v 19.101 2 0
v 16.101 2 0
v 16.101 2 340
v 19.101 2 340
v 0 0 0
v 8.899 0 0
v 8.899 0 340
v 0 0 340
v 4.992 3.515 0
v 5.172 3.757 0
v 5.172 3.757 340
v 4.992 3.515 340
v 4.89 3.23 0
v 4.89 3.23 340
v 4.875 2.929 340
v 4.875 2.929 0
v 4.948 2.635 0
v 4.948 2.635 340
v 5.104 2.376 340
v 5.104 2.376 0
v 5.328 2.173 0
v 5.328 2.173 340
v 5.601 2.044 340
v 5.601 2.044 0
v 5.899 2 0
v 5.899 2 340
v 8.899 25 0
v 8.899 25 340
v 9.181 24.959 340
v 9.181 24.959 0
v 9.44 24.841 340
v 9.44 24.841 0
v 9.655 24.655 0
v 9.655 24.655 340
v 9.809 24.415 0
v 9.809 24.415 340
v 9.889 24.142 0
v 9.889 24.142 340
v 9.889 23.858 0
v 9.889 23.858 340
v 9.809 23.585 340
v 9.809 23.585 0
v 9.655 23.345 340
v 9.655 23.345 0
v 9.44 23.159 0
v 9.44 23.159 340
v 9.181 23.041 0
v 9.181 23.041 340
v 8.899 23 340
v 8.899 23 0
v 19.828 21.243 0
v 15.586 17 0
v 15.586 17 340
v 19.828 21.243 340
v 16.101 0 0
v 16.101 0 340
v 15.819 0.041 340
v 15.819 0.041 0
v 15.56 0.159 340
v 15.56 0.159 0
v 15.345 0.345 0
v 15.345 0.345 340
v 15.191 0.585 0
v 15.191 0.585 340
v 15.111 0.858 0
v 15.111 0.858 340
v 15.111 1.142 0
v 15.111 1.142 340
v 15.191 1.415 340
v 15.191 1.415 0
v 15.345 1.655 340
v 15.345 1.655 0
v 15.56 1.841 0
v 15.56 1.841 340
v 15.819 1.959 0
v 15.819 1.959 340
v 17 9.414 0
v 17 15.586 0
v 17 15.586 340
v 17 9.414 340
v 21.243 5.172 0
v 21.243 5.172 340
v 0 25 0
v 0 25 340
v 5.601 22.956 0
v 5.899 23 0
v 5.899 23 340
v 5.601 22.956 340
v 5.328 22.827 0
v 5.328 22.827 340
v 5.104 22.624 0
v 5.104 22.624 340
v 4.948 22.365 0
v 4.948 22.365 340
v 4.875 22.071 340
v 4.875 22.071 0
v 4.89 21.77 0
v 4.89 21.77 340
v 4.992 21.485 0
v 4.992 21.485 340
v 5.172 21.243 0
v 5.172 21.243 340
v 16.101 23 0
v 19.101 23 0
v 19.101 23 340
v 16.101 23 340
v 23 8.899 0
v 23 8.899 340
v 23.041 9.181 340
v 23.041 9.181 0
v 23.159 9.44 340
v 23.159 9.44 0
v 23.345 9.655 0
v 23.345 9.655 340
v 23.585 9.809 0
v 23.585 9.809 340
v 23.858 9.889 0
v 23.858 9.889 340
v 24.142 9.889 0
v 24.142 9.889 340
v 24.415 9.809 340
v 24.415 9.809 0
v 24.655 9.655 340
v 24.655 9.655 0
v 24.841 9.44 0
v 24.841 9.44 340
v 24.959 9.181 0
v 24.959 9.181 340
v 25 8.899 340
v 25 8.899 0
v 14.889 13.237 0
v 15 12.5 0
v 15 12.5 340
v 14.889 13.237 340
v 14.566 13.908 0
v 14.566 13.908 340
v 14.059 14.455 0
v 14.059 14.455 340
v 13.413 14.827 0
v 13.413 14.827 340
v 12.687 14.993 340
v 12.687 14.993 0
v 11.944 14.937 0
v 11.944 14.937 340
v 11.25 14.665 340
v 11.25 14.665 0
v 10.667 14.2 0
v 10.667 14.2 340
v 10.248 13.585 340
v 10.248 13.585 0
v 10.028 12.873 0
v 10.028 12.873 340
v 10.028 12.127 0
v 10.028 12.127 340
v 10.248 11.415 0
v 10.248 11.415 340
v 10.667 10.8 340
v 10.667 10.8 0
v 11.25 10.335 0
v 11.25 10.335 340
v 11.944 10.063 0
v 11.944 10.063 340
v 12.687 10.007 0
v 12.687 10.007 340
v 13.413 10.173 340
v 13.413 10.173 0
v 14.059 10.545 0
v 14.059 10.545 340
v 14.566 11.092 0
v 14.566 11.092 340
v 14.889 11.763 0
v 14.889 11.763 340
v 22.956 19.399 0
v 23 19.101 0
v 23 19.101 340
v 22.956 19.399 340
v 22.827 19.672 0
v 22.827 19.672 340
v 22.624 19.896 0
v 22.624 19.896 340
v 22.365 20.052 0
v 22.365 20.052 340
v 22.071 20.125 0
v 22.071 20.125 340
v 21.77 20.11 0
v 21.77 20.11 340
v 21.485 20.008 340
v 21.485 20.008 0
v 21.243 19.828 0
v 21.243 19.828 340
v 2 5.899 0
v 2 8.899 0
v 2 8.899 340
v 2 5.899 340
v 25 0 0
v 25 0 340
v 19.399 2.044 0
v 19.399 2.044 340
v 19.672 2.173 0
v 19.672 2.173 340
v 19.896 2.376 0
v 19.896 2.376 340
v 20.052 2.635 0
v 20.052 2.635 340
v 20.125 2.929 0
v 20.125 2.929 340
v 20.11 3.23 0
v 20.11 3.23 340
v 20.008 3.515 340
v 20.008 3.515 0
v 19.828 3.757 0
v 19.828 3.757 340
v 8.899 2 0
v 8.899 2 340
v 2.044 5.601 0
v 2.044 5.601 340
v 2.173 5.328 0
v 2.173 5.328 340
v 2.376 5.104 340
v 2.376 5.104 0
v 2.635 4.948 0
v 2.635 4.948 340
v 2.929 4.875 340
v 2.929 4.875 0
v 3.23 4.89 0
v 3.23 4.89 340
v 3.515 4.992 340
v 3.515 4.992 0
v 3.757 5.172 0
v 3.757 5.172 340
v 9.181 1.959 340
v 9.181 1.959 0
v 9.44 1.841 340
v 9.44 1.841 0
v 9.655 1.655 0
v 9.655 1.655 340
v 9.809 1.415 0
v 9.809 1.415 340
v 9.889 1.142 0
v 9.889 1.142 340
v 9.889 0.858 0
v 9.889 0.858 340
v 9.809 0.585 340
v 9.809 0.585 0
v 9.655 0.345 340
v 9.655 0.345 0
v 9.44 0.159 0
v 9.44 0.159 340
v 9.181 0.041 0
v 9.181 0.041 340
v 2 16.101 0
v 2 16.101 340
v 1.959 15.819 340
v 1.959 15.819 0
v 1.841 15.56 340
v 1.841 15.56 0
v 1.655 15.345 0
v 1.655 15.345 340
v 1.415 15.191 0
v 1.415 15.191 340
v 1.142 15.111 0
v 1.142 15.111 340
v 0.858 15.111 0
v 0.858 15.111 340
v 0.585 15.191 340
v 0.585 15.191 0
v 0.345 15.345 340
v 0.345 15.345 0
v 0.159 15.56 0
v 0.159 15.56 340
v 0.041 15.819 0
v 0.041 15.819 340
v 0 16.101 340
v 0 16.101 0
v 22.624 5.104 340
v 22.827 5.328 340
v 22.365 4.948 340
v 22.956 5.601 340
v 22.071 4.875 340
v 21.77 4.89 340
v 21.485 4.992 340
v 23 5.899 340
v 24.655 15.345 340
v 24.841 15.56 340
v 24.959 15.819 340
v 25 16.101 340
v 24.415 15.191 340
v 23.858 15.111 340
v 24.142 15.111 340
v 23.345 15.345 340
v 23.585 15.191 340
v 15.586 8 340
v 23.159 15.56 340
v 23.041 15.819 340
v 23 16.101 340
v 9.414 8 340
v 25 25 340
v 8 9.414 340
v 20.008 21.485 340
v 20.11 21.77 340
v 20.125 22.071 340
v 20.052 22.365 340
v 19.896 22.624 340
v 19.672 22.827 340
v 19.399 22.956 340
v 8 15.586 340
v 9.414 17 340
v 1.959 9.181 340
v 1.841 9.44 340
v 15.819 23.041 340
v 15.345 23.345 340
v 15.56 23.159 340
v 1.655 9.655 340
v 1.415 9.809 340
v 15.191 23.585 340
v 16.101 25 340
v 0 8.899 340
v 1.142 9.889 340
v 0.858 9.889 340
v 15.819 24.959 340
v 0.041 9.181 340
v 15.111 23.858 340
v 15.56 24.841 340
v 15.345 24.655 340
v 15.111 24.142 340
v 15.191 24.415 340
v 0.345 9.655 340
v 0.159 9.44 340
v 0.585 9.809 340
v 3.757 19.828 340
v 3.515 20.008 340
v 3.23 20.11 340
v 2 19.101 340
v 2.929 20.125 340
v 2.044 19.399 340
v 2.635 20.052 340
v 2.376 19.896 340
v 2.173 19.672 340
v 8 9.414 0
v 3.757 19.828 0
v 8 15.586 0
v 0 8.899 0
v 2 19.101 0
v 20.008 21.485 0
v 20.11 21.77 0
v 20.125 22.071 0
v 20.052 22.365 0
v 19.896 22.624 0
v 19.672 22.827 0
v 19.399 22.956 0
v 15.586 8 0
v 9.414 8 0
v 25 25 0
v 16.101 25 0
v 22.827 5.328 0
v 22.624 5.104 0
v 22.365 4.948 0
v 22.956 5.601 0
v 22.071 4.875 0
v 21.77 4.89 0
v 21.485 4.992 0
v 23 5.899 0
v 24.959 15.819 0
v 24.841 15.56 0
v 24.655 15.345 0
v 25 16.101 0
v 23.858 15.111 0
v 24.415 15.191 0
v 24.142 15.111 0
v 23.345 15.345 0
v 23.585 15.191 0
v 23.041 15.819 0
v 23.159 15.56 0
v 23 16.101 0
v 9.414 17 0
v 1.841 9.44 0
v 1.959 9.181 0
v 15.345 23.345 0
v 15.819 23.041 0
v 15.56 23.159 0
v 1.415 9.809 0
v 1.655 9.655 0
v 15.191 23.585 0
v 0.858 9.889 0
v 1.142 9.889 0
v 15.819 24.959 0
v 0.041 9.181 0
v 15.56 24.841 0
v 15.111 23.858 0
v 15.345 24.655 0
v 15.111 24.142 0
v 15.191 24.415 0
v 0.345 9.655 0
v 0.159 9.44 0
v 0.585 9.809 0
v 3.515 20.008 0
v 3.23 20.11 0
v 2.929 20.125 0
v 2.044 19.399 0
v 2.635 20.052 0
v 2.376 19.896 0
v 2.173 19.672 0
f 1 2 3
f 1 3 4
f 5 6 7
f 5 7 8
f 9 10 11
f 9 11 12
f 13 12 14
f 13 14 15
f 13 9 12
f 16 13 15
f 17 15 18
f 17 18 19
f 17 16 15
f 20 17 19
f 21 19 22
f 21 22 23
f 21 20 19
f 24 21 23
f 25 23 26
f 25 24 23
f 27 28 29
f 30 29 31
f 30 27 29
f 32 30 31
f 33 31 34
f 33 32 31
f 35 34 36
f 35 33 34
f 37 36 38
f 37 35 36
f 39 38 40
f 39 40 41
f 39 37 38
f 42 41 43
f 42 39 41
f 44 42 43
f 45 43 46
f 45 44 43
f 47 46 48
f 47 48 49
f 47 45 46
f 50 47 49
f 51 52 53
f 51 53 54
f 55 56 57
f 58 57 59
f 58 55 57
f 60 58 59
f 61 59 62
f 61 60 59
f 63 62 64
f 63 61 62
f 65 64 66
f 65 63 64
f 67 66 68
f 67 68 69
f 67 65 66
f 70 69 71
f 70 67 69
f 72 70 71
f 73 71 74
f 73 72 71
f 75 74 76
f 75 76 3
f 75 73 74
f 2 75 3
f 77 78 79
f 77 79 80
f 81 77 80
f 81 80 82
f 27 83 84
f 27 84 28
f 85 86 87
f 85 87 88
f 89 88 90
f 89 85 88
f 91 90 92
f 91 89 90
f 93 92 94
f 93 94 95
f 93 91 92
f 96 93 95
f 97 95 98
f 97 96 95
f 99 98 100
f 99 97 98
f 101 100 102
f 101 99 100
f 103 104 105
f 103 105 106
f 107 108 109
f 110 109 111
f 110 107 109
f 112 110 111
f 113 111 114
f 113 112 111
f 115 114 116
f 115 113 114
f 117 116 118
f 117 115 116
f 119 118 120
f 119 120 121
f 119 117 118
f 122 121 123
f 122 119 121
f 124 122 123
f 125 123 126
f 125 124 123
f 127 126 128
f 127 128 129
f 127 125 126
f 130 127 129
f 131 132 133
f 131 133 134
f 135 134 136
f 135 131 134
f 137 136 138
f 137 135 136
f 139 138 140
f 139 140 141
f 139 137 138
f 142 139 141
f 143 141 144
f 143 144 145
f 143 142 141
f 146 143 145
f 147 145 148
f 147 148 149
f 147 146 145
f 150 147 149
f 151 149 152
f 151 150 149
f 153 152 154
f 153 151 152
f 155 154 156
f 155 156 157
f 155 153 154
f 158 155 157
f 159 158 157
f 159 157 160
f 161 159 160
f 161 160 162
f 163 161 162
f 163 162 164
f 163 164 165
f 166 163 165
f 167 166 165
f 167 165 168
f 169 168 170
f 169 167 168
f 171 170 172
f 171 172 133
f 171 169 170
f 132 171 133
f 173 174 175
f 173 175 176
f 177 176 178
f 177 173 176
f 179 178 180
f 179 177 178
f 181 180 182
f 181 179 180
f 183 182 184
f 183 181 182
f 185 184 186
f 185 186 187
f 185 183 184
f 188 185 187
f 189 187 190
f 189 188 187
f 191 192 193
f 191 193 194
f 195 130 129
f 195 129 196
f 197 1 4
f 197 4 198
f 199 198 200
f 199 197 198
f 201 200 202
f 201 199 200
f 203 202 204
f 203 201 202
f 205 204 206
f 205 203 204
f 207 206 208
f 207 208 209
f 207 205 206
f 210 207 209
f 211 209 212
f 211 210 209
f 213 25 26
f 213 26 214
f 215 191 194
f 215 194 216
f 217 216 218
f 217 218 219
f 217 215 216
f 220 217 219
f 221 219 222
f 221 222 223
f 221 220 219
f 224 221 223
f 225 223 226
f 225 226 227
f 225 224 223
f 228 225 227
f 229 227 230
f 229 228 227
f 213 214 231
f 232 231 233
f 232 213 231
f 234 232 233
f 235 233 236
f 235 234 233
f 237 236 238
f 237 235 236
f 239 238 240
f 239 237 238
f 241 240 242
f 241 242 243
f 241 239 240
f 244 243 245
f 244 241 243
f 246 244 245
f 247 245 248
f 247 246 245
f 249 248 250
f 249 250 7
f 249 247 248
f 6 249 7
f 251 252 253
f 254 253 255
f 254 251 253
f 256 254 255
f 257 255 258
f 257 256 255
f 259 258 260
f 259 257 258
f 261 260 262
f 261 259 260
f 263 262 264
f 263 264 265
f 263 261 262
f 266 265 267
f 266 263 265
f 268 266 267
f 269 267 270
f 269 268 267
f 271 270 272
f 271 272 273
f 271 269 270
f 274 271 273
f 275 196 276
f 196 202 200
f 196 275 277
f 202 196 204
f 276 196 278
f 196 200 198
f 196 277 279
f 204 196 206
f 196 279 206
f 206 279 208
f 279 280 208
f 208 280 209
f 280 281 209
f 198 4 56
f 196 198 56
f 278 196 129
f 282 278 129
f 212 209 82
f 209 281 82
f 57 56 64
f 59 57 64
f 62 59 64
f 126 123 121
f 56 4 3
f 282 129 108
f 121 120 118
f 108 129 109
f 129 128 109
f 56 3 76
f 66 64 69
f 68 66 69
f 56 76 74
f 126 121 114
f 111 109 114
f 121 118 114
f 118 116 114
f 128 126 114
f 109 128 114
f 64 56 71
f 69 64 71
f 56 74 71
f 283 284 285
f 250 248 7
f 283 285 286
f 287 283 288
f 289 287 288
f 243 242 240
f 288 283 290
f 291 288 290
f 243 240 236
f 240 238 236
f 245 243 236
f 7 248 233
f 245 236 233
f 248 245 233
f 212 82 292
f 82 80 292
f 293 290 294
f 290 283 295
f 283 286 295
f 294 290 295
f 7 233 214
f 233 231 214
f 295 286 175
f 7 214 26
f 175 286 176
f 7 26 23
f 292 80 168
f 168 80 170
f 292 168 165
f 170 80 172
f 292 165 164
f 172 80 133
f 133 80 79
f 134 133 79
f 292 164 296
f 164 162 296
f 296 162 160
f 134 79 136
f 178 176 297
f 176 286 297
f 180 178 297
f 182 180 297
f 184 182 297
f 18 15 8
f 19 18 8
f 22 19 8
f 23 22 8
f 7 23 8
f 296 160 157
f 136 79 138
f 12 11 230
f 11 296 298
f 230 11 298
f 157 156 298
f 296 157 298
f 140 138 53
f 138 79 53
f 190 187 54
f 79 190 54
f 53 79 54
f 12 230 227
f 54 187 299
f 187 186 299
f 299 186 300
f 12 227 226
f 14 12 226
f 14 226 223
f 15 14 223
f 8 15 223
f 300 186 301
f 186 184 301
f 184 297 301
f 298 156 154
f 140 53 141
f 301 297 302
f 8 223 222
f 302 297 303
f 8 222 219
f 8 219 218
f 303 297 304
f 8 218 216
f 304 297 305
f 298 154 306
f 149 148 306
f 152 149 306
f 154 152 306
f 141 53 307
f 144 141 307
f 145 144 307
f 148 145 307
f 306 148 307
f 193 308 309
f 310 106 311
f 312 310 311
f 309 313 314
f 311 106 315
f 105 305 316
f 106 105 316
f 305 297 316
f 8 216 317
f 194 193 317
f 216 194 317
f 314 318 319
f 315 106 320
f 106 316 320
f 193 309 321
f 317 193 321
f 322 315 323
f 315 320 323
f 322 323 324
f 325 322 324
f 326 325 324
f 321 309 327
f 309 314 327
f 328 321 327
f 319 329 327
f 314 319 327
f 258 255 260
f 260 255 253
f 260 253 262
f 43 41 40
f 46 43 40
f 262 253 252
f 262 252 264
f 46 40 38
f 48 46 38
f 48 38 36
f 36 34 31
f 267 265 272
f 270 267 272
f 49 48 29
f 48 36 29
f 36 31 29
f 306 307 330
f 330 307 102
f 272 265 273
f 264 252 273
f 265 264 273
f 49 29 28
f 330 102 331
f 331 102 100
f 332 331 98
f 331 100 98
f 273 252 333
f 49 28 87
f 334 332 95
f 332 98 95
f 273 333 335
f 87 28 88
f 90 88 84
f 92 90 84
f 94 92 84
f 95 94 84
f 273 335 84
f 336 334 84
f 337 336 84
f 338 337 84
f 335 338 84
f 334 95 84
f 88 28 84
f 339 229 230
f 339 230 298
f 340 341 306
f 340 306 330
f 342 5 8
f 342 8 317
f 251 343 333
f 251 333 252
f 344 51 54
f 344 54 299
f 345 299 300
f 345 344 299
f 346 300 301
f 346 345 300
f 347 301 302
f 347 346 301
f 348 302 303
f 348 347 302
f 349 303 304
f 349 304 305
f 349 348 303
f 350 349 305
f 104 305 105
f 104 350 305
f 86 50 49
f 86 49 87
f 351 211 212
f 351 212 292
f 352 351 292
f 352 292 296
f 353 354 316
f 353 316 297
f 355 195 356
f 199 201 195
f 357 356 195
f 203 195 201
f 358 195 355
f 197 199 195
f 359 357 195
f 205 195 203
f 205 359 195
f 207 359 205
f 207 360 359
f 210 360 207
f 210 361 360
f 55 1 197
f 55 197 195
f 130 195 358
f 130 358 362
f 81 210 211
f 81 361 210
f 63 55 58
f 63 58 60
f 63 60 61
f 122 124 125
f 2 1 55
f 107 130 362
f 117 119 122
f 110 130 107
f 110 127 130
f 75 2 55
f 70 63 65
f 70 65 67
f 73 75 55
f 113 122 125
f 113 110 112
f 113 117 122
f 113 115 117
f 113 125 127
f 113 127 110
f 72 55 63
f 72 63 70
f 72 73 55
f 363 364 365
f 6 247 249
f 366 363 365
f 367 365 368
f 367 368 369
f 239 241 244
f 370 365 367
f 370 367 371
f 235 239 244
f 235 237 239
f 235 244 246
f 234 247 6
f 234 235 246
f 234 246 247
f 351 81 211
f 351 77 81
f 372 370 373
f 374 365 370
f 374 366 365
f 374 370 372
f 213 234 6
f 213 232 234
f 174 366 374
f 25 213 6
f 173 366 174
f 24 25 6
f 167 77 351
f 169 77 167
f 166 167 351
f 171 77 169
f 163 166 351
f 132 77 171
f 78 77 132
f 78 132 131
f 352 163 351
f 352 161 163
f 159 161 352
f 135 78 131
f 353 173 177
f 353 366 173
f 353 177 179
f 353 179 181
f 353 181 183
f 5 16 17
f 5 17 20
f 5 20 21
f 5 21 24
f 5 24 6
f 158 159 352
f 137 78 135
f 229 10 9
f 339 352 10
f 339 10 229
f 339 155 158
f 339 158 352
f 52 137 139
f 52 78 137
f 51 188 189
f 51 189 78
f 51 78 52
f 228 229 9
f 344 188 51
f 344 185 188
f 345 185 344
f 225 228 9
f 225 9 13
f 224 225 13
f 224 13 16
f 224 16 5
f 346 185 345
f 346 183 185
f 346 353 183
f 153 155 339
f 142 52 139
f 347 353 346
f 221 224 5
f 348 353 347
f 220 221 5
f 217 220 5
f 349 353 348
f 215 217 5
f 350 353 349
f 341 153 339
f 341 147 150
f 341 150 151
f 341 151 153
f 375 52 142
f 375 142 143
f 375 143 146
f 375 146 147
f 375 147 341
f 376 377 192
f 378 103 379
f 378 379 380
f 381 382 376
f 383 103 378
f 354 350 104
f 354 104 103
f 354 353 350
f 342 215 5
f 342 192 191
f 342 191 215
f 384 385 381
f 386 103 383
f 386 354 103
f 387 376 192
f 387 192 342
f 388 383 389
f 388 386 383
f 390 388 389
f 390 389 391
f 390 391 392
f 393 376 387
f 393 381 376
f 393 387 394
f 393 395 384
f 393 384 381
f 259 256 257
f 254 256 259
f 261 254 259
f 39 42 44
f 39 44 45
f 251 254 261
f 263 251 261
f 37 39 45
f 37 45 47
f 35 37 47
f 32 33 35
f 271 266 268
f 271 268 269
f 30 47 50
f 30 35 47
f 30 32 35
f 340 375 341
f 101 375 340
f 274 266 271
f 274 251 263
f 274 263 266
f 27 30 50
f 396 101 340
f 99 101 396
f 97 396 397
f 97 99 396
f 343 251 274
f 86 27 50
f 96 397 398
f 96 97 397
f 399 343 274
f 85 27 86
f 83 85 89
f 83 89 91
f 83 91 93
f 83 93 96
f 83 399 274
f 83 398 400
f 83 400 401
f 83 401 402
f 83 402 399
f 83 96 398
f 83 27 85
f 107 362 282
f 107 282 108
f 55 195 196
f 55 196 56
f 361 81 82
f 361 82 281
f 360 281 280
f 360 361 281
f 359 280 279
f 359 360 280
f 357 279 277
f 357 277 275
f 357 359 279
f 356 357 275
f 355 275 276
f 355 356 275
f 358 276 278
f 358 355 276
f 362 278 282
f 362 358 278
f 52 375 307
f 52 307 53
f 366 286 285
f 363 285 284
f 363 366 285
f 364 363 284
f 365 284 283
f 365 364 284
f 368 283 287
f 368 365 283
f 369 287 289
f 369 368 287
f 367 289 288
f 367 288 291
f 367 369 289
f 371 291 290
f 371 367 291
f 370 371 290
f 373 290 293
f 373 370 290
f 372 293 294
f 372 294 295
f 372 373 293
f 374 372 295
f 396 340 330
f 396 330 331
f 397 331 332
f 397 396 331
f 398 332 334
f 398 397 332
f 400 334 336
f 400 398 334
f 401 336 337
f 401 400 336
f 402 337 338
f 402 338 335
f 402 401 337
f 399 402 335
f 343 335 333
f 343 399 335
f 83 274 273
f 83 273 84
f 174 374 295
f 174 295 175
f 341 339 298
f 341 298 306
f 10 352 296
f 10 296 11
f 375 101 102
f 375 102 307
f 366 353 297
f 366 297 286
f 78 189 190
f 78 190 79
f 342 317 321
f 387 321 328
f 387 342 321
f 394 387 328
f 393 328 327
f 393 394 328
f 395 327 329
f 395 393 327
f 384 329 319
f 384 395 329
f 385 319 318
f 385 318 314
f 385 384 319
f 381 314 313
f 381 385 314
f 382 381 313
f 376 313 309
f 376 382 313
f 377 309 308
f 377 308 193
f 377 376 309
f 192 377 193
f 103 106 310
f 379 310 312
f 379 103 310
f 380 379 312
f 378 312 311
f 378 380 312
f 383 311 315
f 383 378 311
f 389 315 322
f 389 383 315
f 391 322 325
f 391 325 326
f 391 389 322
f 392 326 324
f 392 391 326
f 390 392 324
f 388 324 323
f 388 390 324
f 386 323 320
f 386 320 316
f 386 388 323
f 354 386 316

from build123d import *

# Parameters (mm, degrees)
SKETCH2_R           = 2.5
BOSS_EXTRUDE1_DEPTH = 340


with BuildPart() as part:
    # Sketch2 → Boss-Extrude1 (new body)
    with BuildSketch(Plane.XY):
        with BuildLine():
            ThreePointArc((16.100505063, 0), (15.100505063, 1), (16.100505063, 2))
            Line((16.100505063, 2), (19.100505063, 2))
            ThreePointArc((19.100505063, 2), (20.05158107, 2.635488671), (19.828427125, 3.757359313))
            Line((19.828427125, 3.757359313), (15.585786438, 8))
            Line((15.585786438, 8), (12.5, 8))
            Line((12.5, 8), (9.414213562, 8))
            Line((9.414213562, 8), (5.171572875, 3.757359313))
            ThreePointArc((5.171572875, 3.757359313), (4.94841893, 2.635488671), (5.899494937, 2))
            Line((5.899494937, 2), (8.899494937, 2))
            ThreePointArc((8.899494937, 2), (9.899494937, 1), (8.899494937, 0))
            Line((8.899494937, 0), (0, 0))
            Line((0, 0), (0, 8.899494937))
            ThreePointArc((0, 8.899494937), (1, 9.899494937), (2, 8.899494937))
            Line((2, 8.899494937), (2, 5.899494937))
            ThreePointArc((2, 5.899494937), (2.635488671, 4.94841893), (3.757359313, 5.171572875))
            Line((3.757359313, 5.171572875), (8, 9.414213562))
            Line((8, 9.414213562), (8, 12.5))
            Line((8, 12.5), (8, 15.585786438))
            Line((8, 15.585786438), (3.757359313, 19.828427125))
            ThreePointArc((3.757359313, 19.828427125), (2.635488671, 20.05158107), (2, 19.100505063))
            Line((2, 19.100505063), (2, 16.100505063))
            ThreePointArc((2, 16.100505063), (1, 15.100505063), (0, 16.100505063))
            Line((0, 16.100505063), (0, 25))
            Line((0, 25), (8.899494937, 25))
            ThreePointArc((8.899494937, 25), (9.899494937, 24), (8.899494937, 23))
            Line((8.899494937, 23), (5.899494937, 23))
            ThreePointArc((5.899494937, 23), (4.94841893, 22.364511329), (5.171572875, 21.242640687))
            Line((5.171572875, 21.242640687), (9.414213562, 17))
            Line((9.414213562, 17), (12.5, 17))
            Line((12.5, 17), (15.585786438, 17))
            Line((15.585786438, 17), (19.828427125, 21.242640687))
            ThreePointArc((19.828427125, 21.242640687), (20.05158107, 22.364511329), (19.100505063, 23))
            Line((19.100505063, 23), (16.100505063, 23))
            ThreePointArc((16.100505063, 23), (15.100505063, 24), (16.100505063, 25))
            Line((16.100505063, 25), (25, 25))
            Line((25, 25), (25, 16.100505063))
            ThreePointArc((25, 16.100505063), (24, 15.100505063), (23, 16.100505063))
            Line((23, 16.100505063), (23, 19.100505063))
            ThreePointArc((23, 19.100505063), (22.364511329, 20.05158107), (21.242640687, 19.828427125))
            Line((21.242640687, 19.828427125), (17, 15.585786438))
            Line((17, 15.585786438), (17, 12.5))
            Line((17, 12.5), (17, 9.414213562))
            Line((17, 9.414213562), (21.242640687, 5.171572875))
            ThreePointArc((21.242640687, 5.171572875), (22.364511329, 4.94841893), (23, 5.899494937))
            Line((23, 5.899494937), (23, 8.899494937))
            ThreePointArc((23, 8.899494937), (24, 9.899494937), (25, 8.899494937))
            Line((25, 8.899494937), (25, 0))
            Line((25, 0), (16.100505063, 0))
        make_face()
        with Locations((12.5, 12.5)):
            Circle(SKETCH2_R, mode=Mode.SUBTRACT)
    extrude(amount=BOSS_EXTRUDE1_DEPTH)


solid = part.part
